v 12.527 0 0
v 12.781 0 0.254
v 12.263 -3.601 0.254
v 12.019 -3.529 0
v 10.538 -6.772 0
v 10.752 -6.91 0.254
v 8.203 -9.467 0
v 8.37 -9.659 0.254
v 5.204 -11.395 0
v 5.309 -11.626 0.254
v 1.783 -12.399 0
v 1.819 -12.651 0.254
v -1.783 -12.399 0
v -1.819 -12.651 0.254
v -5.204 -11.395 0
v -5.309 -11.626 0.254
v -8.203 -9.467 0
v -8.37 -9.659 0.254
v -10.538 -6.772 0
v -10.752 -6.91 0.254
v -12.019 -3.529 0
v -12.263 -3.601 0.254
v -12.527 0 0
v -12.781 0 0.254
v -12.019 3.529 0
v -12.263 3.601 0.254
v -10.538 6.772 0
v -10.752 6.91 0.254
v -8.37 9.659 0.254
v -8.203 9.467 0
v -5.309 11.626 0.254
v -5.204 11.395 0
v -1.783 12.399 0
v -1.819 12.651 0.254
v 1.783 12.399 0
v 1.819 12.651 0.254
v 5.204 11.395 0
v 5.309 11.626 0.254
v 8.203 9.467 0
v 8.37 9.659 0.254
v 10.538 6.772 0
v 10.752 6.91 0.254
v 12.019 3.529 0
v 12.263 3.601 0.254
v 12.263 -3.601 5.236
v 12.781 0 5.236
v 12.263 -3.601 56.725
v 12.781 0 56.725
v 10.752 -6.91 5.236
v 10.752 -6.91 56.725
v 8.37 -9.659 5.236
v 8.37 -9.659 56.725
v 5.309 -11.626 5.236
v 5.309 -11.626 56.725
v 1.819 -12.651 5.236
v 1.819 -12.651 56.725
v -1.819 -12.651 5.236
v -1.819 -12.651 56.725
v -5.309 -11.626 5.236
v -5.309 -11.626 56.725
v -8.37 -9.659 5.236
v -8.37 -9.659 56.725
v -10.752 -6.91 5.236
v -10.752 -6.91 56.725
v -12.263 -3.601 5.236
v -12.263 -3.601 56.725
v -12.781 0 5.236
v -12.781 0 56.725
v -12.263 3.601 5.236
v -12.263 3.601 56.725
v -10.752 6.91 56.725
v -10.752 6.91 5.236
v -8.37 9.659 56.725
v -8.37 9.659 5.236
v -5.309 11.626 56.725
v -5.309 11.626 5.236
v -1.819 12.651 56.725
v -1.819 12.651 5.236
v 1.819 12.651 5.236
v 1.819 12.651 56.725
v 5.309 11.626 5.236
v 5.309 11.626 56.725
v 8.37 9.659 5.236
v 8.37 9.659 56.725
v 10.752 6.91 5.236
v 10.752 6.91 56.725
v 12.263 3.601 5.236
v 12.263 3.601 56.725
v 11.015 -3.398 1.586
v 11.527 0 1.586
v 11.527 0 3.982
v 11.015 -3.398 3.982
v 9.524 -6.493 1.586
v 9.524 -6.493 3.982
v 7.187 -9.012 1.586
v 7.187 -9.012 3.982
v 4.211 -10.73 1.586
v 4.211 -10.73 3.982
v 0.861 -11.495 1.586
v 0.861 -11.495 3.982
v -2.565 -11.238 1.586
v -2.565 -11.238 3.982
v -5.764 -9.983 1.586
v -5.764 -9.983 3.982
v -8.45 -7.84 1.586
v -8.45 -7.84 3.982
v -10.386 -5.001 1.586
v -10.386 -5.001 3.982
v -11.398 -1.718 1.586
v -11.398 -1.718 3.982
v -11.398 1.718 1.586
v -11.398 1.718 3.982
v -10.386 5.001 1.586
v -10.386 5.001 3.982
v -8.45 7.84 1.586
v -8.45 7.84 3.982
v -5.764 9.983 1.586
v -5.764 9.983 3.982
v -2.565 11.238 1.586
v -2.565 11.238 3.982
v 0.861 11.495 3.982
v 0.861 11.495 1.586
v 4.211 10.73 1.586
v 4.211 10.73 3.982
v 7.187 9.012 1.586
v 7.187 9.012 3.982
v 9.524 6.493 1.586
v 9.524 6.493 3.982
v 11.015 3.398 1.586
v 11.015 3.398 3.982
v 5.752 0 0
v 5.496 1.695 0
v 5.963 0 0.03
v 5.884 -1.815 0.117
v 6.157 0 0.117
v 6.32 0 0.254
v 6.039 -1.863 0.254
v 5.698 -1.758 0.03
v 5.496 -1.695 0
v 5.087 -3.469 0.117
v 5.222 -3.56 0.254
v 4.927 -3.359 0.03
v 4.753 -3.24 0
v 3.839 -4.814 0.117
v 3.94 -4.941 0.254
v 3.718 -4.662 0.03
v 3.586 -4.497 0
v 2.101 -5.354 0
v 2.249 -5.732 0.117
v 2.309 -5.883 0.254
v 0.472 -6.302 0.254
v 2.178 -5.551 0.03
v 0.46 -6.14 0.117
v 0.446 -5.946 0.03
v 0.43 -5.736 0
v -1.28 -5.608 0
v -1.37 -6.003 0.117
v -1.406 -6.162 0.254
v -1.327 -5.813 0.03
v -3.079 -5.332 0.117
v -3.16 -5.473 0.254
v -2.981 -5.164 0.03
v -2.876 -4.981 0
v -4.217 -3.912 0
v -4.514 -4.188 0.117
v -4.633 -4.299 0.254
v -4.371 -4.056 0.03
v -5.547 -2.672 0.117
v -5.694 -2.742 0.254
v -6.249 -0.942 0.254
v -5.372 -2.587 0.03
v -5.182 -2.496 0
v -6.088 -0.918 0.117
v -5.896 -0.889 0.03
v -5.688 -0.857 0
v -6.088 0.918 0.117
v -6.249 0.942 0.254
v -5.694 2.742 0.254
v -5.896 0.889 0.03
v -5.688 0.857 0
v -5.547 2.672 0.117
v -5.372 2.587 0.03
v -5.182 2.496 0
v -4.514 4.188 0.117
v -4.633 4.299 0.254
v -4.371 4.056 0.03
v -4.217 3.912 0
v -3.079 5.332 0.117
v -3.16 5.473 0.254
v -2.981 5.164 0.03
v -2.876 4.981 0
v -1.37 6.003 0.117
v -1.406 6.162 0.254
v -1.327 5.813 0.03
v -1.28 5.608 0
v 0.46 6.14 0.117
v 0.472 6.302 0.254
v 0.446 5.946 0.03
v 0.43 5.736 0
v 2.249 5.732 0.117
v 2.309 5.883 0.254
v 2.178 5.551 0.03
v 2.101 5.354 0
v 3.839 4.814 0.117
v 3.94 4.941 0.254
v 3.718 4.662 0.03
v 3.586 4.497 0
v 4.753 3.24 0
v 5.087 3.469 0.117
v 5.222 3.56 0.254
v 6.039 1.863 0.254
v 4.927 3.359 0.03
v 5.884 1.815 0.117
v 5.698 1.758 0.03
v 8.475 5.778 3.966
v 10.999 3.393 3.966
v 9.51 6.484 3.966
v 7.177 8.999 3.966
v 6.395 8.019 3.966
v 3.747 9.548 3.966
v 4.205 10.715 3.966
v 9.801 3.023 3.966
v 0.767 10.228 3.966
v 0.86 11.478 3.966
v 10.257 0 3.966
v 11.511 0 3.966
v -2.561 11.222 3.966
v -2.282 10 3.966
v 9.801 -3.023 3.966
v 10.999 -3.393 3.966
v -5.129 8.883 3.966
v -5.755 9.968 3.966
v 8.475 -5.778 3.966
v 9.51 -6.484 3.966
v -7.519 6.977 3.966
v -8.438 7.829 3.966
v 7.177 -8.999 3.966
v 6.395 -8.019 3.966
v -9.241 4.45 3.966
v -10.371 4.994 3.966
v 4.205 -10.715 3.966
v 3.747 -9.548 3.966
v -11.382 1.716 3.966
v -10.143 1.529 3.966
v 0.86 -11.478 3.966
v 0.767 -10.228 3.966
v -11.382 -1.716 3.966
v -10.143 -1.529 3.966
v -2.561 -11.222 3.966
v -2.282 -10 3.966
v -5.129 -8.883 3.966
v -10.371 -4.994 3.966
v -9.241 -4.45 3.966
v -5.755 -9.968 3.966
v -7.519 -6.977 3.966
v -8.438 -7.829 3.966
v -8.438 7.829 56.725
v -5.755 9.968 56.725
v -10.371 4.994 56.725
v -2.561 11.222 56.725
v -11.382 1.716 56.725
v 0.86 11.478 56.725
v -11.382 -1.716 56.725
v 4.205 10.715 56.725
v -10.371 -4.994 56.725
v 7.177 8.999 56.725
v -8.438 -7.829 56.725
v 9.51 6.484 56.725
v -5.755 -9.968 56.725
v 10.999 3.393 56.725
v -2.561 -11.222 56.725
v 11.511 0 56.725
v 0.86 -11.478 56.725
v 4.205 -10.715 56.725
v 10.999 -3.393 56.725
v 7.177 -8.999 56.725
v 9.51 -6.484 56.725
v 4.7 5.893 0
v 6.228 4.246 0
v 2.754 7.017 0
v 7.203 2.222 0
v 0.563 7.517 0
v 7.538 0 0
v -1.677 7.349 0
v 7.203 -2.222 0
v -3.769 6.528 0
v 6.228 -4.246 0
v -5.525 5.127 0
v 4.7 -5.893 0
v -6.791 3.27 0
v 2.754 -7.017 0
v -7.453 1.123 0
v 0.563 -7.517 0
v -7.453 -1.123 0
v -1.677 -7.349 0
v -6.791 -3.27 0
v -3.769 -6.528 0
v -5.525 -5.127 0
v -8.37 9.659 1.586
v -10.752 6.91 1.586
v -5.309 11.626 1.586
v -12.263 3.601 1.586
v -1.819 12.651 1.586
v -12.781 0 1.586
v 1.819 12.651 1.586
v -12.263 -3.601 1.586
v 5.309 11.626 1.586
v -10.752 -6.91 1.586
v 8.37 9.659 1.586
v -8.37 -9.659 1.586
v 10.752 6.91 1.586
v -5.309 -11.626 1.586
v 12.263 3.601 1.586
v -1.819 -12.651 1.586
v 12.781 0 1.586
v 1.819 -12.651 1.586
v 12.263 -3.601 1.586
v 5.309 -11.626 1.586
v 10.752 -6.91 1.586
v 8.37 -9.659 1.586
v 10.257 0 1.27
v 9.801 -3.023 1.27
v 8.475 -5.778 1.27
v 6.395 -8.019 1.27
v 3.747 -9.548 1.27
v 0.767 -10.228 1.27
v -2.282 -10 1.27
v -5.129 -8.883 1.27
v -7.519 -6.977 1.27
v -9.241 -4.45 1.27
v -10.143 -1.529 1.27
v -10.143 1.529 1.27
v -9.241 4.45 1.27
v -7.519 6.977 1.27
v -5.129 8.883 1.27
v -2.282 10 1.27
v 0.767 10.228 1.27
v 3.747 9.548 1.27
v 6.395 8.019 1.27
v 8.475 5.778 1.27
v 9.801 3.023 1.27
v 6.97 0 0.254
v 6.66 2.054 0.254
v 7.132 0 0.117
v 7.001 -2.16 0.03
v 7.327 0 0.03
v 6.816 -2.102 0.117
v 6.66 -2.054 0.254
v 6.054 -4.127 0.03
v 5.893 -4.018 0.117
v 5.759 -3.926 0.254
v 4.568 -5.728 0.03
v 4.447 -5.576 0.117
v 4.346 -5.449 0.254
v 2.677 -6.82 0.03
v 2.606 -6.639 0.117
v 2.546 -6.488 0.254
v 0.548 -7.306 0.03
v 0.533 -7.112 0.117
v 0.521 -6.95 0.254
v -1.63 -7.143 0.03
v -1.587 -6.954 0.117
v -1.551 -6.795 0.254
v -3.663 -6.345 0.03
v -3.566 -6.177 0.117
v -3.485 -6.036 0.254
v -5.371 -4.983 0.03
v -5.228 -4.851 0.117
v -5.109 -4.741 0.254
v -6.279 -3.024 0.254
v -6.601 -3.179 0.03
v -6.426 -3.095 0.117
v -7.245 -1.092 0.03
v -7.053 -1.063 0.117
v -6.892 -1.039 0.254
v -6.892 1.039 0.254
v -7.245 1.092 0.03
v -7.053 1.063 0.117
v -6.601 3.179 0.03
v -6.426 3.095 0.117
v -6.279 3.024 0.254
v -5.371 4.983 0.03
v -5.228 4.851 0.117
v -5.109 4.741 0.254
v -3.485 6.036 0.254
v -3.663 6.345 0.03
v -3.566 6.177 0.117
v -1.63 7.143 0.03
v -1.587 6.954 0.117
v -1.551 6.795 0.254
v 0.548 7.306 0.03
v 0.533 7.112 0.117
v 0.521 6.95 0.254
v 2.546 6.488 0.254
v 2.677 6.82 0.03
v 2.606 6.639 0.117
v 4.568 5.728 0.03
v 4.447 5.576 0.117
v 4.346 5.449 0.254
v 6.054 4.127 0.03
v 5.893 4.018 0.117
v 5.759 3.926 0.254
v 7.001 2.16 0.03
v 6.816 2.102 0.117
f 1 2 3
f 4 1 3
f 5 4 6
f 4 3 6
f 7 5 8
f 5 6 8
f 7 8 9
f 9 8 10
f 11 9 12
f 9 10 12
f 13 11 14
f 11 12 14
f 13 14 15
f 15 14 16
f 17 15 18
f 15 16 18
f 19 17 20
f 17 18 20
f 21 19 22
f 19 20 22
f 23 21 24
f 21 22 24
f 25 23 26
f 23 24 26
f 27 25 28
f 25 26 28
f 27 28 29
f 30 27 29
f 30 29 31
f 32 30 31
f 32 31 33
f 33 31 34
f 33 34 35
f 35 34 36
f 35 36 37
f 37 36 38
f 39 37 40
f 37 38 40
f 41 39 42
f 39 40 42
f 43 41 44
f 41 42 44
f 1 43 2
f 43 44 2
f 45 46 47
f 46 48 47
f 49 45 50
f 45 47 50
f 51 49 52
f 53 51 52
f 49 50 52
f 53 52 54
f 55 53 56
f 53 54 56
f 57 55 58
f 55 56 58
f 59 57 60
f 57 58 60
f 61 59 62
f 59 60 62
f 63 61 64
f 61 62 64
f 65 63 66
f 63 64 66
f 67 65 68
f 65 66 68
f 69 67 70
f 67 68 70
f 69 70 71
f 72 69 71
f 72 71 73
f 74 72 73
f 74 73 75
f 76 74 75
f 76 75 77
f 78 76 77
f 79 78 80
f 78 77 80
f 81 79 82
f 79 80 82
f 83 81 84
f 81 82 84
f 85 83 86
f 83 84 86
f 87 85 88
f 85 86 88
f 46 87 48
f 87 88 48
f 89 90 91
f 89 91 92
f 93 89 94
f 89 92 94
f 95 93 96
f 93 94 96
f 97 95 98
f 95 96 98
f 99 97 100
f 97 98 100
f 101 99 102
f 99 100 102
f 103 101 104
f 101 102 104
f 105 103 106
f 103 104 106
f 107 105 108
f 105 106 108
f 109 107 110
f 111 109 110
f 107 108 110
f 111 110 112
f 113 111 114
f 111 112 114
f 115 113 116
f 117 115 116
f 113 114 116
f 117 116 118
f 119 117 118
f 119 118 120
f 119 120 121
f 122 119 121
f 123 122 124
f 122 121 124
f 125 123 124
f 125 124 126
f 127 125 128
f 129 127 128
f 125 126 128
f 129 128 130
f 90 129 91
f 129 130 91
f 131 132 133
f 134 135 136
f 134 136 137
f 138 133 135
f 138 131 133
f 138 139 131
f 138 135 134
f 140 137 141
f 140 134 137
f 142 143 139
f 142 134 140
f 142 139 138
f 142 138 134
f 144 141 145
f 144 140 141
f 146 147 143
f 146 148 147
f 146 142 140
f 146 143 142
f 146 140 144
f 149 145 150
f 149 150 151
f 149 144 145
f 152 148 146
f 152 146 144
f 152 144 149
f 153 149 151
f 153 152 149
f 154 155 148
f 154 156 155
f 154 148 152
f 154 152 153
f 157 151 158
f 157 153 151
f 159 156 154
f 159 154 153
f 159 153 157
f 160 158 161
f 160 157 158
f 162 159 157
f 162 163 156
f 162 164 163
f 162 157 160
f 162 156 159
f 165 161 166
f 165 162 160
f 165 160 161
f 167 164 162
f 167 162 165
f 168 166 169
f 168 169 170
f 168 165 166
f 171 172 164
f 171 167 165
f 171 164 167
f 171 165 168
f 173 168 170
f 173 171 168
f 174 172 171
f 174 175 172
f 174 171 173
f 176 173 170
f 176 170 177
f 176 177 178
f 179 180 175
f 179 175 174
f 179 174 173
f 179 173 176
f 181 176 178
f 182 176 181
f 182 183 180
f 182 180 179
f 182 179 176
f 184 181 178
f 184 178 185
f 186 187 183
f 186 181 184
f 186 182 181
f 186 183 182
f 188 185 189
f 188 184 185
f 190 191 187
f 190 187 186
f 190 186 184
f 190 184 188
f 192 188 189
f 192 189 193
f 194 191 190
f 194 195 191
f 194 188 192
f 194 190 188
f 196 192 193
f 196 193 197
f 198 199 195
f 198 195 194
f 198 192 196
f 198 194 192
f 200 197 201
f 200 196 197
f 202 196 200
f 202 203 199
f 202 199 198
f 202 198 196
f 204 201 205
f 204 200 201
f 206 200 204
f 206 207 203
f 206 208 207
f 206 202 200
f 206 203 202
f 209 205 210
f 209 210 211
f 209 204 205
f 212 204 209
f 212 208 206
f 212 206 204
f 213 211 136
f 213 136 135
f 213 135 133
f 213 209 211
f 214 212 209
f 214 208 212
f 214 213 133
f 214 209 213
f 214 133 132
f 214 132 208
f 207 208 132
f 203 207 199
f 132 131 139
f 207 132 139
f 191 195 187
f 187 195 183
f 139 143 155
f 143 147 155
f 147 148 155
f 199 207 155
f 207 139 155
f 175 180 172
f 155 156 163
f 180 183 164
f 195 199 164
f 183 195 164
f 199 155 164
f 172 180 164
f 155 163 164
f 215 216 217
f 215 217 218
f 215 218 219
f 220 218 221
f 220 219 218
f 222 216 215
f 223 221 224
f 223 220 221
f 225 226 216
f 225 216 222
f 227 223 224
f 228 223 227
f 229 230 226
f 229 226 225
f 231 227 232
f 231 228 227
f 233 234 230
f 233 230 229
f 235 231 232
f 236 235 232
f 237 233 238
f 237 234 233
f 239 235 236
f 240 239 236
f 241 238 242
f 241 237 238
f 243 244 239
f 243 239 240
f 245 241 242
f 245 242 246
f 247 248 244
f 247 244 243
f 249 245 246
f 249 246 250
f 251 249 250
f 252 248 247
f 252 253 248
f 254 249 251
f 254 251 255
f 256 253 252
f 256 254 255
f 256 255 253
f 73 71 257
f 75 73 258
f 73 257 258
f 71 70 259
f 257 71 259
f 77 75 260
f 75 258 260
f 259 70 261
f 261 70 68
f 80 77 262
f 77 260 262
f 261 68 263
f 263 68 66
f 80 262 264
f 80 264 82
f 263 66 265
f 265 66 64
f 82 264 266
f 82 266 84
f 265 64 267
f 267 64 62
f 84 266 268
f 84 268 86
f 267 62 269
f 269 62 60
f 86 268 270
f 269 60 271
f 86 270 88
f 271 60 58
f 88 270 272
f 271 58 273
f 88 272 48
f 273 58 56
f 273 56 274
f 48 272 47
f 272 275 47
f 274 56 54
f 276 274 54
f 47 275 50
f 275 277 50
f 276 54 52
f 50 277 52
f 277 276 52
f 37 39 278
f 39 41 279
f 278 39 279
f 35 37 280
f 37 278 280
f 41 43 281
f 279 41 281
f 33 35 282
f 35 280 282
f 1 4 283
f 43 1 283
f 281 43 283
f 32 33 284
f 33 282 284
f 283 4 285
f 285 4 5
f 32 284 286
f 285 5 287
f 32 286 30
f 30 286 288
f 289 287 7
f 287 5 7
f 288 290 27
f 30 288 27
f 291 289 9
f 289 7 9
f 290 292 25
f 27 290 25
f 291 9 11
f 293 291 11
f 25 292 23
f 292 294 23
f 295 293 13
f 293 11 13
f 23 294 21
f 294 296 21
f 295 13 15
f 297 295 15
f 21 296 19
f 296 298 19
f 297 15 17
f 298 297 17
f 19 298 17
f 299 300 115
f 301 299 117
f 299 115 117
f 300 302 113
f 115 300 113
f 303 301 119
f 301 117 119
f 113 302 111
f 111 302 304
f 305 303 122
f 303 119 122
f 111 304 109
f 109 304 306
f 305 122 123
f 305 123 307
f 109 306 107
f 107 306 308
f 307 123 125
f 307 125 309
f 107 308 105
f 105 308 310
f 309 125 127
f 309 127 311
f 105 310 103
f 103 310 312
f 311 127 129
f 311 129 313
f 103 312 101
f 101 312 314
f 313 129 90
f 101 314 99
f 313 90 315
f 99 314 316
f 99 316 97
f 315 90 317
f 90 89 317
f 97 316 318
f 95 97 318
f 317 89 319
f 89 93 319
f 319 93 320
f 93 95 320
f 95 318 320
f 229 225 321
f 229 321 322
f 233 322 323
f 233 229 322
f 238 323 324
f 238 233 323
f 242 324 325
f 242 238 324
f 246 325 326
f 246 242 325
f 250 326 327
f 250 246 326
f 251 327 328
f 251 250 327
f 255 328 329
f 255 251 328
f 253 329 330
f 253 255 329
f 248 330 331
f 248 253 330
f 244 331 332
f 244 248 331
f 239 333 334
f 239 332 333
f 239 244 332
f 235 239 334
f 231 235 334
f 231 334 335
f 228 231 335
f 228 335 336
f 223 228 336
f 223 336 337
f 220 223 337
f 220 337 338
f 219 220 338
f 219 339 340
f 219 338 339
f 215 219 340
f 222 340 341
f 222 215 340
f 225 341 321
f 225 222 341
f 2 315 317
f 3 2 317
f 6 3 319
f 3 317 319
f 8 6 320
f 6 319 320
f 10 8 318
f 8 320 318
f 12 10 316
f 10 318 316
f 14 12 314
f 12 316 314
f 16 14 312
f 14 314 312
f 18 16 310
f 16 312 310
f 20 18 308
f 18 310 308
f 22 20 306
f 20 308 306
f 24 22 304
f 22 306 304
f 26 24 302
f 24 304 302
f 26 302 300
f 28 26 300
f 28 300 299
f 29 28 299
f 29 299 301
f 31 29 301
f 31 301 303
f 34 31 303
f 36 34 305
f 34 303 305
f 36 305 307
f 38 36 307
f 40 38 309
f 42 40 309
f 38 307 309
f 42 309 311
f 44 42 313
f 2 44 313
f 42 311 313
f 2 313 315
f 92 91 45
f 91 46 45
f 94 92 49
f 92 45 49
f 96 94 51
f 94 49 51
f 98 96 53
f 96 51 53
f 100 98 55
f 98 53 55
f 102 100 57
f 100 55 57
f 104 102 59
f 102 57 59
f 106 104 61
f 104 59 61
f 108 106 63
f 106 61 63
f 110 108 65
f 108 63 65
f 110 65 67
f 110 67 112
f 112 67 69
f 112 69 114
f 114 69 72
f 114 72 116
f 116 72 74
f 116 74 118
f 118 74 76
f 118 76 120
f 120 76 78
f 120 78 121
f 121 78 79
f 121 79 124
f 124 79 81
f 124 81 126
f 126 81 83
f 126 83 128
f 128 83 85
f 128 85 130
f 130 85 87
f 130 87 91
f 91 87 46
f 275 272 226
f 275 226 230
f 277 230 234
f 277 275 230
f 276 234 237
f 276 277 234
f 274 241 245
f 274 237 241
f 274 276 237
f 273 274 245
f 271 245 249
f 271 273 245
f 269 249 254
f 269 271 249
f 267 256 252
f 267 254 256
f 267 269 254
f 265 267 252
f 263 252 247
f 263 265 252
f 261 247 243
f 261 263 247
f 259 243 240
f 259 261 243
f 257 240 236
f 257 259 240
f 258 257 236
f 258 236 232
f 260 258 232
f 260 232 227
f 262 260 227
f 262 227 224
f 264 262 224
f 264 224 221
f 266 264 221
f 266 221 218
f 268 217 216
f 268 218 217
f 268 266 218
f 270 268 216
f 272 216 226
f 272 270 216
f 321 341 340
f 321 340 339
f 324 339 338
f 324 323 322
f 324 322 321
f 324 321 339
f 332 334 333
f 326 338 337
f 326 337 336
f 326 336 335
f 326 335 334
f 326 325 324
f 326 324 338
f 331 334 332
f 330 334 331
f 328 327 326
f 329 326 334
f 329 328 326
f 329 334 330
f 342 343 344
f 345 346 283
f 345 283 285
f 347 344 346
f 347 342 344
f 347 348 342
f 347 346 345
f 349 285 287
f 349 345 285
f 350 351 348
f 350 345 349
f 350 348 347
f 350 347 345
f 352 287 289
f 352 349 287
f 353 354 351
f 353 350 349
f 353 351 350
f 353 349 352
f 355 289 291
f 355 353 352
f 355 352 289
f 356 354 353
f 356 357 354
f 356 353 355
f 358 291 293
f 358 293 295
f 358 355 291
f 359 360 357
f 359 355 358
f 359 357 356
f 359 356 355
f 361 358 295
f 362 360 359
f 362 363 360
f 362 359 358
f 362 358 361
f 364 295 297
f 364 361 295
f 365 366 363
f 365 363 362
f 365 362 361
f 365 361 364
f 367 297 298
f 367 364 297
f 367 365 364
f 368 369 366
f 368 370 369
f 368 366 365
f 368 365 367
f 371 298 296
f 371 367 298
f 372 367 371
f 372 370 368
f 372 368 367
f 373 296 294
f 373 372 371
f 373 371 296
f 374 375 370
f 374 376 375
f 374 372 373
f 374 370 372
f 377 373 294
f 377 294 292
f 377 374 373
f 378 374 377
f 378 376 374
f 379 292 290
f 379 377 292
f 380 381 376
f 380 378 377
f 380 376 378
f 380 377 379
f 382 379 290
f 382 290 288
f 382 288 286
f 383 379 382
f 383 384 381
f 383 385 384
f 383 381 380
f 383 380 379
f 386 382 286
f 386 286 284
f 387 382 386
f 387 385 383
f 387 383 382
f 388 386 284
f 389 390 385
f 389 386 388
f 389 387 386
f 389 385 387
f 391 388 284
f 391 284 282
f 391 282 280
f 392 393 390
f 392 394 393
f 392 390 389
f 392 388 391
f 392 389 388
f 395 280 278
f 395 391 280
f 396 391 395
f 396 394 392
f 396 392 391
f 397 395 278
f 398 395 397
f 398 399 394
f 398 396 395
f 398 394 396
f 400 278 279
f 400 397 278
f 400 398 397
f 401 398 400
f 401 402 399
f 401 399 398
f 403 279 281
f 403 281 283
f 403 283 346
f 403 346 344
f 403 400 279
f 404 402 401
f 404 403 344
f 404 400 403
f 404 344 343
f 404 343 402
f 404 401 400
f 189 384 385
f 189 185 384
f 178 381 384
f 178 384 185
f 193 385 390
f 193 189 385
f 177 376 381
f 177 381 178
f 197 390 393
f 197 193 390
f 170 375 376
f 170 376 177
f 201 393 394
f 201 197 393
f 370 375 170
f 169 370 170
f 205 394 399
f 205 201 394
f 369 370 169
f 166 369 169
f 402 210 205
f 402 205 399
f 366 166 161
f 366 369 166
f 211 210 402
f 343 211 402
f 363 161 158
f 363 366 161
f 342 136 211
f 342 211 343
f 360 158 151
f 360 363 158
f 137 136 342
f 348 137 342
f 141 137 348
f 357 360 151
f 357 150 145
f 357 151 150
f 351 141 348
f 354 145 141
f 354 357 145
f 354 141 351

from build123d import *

# Parameters (mm, degrees)
F2_T        = -1.27
F3_SIZE     = 0.254
F4_R        = 6.9696549561
F4_R_2      = 6.3199888533
F5_DEPTH    = 0.254
F7_S5_R     = 11.5270866081
F7_T6_DEPTH = 20


# Not quite as in the source:
# - a fillet or chamfer that OpenCascade refuses, or shapes differently, is made with other operations: its cross-section is extruded or revolved along the edge and cut away or added


with BuildPart() as f1:
    # F0 (on Front) → F1 (revolve)
    with BuildSketch(Plane.XZ):
        Polygon((0, 56.7248165607), (0, 0), (12.7805937082, 0), (12.7805937082, 1.5856500249), (11.5270866081, 1.5856500249), (11.5270866081, 2.6958733797), (12.7805937082, 2.6958733797), (12.7805937082, 56.7248165607), align=None)
    revolve(axis=Axis((0, 0, 24.1605676711), (0, 0, -1)))

    # F2
    f2_openings = [f1.faces().sort_by_distance(p)[0] for p in [
        (0, 0, 56.724817),
    ]]
    offset(amount=F2_T, openings=f2_openings, kind=Kind.INTERSECTION)

    # F3
    f3_edges = [f1.edges().sort_by_distance(p)[0] for p in [
        (-12.780594, 0, 0),
    ]]
    chamfer(f3_edges, length=F3_SIZE)

    # F4 (on face) → F5 (cut)
    with BuildSketch(Plane(origin=(0, 0, 0), x_dir=(1, 0, 0), z_dir=(0, 0, -1))):
        Circle(F4_R)
        Circle(F4_R_2, mode=Mode.SUBTRACT)
    extrude(amount=-F5_DEPTH, mode=Mode.SUBTRACT)

    # F6: fillet of radius 0.762 on 2 edges, made by hand

    # F6_s1 → F6_t2 (revolve, cut)
    with BuildSketch(Plane.XZ):
        with BuildLine():
            ThreePointArc((6.3199888533, 0.254), (6.0631127843, 0.066392352), (5.752027587, 0))
            Line((5.752027587, 0), (6.3199888533, 0))
            Line((6.3199888533, 0), (6.3199888533, 0.254))
        make_face()
    revolve(axis=Axis((0, 0, 0), (0, 0, -1)), mode=Mode.SUBTRACT)

    # F6_s3 → F6_t4 (revolve, cut)
    with BuildSketch(Plane.XZ):
        with BuildLine():
            ThreePointArc((7.5376162224, 0), (7.226531025, 0.066392352), (6.9696549561, 0.254))
            Line((6.9696549561, 0.254), (6.9696549561, 0))
            Line((6.9696549561, 0), (7.5376162224, 0))
        make_face()
    revolve(axis=Axis((0, 0, 0), (0, 0, -1)), mode=Mode.SUBTRACT)

    # F7: chamfer of 2.54 on 1 edges, made by hand


with BuildPart() as f7_tool2:
    # F7_s3 → F7_t4 (revolve)
    with BuildSketch(Plane.XZ):
        Polygon((10.2405937082, 2.6958733797), (12.7805937082, 5.2358733797), (12.7805937082, 2.6958733797), align=None)
    revolve(axis=Axis((0, 0, 2.6958733797), (0, 0, -1)))

    # F7_s5 → F7_t6 (cut, symmetric)
    with BuildSketch(Plane.XY.offset(4)):
        Circle(F7_S5_R)
    extrude(amount=F7_T6_DEPTH, both=True, mode=Mode.SUBTRACT)


with BuildPart() as f1_1:
    add(f1.part)

    # F7_t1: cut F7_tool2
    add(f7_tool2.part, mode=Mode.SUBTRACT)


solid = f1_1.part
